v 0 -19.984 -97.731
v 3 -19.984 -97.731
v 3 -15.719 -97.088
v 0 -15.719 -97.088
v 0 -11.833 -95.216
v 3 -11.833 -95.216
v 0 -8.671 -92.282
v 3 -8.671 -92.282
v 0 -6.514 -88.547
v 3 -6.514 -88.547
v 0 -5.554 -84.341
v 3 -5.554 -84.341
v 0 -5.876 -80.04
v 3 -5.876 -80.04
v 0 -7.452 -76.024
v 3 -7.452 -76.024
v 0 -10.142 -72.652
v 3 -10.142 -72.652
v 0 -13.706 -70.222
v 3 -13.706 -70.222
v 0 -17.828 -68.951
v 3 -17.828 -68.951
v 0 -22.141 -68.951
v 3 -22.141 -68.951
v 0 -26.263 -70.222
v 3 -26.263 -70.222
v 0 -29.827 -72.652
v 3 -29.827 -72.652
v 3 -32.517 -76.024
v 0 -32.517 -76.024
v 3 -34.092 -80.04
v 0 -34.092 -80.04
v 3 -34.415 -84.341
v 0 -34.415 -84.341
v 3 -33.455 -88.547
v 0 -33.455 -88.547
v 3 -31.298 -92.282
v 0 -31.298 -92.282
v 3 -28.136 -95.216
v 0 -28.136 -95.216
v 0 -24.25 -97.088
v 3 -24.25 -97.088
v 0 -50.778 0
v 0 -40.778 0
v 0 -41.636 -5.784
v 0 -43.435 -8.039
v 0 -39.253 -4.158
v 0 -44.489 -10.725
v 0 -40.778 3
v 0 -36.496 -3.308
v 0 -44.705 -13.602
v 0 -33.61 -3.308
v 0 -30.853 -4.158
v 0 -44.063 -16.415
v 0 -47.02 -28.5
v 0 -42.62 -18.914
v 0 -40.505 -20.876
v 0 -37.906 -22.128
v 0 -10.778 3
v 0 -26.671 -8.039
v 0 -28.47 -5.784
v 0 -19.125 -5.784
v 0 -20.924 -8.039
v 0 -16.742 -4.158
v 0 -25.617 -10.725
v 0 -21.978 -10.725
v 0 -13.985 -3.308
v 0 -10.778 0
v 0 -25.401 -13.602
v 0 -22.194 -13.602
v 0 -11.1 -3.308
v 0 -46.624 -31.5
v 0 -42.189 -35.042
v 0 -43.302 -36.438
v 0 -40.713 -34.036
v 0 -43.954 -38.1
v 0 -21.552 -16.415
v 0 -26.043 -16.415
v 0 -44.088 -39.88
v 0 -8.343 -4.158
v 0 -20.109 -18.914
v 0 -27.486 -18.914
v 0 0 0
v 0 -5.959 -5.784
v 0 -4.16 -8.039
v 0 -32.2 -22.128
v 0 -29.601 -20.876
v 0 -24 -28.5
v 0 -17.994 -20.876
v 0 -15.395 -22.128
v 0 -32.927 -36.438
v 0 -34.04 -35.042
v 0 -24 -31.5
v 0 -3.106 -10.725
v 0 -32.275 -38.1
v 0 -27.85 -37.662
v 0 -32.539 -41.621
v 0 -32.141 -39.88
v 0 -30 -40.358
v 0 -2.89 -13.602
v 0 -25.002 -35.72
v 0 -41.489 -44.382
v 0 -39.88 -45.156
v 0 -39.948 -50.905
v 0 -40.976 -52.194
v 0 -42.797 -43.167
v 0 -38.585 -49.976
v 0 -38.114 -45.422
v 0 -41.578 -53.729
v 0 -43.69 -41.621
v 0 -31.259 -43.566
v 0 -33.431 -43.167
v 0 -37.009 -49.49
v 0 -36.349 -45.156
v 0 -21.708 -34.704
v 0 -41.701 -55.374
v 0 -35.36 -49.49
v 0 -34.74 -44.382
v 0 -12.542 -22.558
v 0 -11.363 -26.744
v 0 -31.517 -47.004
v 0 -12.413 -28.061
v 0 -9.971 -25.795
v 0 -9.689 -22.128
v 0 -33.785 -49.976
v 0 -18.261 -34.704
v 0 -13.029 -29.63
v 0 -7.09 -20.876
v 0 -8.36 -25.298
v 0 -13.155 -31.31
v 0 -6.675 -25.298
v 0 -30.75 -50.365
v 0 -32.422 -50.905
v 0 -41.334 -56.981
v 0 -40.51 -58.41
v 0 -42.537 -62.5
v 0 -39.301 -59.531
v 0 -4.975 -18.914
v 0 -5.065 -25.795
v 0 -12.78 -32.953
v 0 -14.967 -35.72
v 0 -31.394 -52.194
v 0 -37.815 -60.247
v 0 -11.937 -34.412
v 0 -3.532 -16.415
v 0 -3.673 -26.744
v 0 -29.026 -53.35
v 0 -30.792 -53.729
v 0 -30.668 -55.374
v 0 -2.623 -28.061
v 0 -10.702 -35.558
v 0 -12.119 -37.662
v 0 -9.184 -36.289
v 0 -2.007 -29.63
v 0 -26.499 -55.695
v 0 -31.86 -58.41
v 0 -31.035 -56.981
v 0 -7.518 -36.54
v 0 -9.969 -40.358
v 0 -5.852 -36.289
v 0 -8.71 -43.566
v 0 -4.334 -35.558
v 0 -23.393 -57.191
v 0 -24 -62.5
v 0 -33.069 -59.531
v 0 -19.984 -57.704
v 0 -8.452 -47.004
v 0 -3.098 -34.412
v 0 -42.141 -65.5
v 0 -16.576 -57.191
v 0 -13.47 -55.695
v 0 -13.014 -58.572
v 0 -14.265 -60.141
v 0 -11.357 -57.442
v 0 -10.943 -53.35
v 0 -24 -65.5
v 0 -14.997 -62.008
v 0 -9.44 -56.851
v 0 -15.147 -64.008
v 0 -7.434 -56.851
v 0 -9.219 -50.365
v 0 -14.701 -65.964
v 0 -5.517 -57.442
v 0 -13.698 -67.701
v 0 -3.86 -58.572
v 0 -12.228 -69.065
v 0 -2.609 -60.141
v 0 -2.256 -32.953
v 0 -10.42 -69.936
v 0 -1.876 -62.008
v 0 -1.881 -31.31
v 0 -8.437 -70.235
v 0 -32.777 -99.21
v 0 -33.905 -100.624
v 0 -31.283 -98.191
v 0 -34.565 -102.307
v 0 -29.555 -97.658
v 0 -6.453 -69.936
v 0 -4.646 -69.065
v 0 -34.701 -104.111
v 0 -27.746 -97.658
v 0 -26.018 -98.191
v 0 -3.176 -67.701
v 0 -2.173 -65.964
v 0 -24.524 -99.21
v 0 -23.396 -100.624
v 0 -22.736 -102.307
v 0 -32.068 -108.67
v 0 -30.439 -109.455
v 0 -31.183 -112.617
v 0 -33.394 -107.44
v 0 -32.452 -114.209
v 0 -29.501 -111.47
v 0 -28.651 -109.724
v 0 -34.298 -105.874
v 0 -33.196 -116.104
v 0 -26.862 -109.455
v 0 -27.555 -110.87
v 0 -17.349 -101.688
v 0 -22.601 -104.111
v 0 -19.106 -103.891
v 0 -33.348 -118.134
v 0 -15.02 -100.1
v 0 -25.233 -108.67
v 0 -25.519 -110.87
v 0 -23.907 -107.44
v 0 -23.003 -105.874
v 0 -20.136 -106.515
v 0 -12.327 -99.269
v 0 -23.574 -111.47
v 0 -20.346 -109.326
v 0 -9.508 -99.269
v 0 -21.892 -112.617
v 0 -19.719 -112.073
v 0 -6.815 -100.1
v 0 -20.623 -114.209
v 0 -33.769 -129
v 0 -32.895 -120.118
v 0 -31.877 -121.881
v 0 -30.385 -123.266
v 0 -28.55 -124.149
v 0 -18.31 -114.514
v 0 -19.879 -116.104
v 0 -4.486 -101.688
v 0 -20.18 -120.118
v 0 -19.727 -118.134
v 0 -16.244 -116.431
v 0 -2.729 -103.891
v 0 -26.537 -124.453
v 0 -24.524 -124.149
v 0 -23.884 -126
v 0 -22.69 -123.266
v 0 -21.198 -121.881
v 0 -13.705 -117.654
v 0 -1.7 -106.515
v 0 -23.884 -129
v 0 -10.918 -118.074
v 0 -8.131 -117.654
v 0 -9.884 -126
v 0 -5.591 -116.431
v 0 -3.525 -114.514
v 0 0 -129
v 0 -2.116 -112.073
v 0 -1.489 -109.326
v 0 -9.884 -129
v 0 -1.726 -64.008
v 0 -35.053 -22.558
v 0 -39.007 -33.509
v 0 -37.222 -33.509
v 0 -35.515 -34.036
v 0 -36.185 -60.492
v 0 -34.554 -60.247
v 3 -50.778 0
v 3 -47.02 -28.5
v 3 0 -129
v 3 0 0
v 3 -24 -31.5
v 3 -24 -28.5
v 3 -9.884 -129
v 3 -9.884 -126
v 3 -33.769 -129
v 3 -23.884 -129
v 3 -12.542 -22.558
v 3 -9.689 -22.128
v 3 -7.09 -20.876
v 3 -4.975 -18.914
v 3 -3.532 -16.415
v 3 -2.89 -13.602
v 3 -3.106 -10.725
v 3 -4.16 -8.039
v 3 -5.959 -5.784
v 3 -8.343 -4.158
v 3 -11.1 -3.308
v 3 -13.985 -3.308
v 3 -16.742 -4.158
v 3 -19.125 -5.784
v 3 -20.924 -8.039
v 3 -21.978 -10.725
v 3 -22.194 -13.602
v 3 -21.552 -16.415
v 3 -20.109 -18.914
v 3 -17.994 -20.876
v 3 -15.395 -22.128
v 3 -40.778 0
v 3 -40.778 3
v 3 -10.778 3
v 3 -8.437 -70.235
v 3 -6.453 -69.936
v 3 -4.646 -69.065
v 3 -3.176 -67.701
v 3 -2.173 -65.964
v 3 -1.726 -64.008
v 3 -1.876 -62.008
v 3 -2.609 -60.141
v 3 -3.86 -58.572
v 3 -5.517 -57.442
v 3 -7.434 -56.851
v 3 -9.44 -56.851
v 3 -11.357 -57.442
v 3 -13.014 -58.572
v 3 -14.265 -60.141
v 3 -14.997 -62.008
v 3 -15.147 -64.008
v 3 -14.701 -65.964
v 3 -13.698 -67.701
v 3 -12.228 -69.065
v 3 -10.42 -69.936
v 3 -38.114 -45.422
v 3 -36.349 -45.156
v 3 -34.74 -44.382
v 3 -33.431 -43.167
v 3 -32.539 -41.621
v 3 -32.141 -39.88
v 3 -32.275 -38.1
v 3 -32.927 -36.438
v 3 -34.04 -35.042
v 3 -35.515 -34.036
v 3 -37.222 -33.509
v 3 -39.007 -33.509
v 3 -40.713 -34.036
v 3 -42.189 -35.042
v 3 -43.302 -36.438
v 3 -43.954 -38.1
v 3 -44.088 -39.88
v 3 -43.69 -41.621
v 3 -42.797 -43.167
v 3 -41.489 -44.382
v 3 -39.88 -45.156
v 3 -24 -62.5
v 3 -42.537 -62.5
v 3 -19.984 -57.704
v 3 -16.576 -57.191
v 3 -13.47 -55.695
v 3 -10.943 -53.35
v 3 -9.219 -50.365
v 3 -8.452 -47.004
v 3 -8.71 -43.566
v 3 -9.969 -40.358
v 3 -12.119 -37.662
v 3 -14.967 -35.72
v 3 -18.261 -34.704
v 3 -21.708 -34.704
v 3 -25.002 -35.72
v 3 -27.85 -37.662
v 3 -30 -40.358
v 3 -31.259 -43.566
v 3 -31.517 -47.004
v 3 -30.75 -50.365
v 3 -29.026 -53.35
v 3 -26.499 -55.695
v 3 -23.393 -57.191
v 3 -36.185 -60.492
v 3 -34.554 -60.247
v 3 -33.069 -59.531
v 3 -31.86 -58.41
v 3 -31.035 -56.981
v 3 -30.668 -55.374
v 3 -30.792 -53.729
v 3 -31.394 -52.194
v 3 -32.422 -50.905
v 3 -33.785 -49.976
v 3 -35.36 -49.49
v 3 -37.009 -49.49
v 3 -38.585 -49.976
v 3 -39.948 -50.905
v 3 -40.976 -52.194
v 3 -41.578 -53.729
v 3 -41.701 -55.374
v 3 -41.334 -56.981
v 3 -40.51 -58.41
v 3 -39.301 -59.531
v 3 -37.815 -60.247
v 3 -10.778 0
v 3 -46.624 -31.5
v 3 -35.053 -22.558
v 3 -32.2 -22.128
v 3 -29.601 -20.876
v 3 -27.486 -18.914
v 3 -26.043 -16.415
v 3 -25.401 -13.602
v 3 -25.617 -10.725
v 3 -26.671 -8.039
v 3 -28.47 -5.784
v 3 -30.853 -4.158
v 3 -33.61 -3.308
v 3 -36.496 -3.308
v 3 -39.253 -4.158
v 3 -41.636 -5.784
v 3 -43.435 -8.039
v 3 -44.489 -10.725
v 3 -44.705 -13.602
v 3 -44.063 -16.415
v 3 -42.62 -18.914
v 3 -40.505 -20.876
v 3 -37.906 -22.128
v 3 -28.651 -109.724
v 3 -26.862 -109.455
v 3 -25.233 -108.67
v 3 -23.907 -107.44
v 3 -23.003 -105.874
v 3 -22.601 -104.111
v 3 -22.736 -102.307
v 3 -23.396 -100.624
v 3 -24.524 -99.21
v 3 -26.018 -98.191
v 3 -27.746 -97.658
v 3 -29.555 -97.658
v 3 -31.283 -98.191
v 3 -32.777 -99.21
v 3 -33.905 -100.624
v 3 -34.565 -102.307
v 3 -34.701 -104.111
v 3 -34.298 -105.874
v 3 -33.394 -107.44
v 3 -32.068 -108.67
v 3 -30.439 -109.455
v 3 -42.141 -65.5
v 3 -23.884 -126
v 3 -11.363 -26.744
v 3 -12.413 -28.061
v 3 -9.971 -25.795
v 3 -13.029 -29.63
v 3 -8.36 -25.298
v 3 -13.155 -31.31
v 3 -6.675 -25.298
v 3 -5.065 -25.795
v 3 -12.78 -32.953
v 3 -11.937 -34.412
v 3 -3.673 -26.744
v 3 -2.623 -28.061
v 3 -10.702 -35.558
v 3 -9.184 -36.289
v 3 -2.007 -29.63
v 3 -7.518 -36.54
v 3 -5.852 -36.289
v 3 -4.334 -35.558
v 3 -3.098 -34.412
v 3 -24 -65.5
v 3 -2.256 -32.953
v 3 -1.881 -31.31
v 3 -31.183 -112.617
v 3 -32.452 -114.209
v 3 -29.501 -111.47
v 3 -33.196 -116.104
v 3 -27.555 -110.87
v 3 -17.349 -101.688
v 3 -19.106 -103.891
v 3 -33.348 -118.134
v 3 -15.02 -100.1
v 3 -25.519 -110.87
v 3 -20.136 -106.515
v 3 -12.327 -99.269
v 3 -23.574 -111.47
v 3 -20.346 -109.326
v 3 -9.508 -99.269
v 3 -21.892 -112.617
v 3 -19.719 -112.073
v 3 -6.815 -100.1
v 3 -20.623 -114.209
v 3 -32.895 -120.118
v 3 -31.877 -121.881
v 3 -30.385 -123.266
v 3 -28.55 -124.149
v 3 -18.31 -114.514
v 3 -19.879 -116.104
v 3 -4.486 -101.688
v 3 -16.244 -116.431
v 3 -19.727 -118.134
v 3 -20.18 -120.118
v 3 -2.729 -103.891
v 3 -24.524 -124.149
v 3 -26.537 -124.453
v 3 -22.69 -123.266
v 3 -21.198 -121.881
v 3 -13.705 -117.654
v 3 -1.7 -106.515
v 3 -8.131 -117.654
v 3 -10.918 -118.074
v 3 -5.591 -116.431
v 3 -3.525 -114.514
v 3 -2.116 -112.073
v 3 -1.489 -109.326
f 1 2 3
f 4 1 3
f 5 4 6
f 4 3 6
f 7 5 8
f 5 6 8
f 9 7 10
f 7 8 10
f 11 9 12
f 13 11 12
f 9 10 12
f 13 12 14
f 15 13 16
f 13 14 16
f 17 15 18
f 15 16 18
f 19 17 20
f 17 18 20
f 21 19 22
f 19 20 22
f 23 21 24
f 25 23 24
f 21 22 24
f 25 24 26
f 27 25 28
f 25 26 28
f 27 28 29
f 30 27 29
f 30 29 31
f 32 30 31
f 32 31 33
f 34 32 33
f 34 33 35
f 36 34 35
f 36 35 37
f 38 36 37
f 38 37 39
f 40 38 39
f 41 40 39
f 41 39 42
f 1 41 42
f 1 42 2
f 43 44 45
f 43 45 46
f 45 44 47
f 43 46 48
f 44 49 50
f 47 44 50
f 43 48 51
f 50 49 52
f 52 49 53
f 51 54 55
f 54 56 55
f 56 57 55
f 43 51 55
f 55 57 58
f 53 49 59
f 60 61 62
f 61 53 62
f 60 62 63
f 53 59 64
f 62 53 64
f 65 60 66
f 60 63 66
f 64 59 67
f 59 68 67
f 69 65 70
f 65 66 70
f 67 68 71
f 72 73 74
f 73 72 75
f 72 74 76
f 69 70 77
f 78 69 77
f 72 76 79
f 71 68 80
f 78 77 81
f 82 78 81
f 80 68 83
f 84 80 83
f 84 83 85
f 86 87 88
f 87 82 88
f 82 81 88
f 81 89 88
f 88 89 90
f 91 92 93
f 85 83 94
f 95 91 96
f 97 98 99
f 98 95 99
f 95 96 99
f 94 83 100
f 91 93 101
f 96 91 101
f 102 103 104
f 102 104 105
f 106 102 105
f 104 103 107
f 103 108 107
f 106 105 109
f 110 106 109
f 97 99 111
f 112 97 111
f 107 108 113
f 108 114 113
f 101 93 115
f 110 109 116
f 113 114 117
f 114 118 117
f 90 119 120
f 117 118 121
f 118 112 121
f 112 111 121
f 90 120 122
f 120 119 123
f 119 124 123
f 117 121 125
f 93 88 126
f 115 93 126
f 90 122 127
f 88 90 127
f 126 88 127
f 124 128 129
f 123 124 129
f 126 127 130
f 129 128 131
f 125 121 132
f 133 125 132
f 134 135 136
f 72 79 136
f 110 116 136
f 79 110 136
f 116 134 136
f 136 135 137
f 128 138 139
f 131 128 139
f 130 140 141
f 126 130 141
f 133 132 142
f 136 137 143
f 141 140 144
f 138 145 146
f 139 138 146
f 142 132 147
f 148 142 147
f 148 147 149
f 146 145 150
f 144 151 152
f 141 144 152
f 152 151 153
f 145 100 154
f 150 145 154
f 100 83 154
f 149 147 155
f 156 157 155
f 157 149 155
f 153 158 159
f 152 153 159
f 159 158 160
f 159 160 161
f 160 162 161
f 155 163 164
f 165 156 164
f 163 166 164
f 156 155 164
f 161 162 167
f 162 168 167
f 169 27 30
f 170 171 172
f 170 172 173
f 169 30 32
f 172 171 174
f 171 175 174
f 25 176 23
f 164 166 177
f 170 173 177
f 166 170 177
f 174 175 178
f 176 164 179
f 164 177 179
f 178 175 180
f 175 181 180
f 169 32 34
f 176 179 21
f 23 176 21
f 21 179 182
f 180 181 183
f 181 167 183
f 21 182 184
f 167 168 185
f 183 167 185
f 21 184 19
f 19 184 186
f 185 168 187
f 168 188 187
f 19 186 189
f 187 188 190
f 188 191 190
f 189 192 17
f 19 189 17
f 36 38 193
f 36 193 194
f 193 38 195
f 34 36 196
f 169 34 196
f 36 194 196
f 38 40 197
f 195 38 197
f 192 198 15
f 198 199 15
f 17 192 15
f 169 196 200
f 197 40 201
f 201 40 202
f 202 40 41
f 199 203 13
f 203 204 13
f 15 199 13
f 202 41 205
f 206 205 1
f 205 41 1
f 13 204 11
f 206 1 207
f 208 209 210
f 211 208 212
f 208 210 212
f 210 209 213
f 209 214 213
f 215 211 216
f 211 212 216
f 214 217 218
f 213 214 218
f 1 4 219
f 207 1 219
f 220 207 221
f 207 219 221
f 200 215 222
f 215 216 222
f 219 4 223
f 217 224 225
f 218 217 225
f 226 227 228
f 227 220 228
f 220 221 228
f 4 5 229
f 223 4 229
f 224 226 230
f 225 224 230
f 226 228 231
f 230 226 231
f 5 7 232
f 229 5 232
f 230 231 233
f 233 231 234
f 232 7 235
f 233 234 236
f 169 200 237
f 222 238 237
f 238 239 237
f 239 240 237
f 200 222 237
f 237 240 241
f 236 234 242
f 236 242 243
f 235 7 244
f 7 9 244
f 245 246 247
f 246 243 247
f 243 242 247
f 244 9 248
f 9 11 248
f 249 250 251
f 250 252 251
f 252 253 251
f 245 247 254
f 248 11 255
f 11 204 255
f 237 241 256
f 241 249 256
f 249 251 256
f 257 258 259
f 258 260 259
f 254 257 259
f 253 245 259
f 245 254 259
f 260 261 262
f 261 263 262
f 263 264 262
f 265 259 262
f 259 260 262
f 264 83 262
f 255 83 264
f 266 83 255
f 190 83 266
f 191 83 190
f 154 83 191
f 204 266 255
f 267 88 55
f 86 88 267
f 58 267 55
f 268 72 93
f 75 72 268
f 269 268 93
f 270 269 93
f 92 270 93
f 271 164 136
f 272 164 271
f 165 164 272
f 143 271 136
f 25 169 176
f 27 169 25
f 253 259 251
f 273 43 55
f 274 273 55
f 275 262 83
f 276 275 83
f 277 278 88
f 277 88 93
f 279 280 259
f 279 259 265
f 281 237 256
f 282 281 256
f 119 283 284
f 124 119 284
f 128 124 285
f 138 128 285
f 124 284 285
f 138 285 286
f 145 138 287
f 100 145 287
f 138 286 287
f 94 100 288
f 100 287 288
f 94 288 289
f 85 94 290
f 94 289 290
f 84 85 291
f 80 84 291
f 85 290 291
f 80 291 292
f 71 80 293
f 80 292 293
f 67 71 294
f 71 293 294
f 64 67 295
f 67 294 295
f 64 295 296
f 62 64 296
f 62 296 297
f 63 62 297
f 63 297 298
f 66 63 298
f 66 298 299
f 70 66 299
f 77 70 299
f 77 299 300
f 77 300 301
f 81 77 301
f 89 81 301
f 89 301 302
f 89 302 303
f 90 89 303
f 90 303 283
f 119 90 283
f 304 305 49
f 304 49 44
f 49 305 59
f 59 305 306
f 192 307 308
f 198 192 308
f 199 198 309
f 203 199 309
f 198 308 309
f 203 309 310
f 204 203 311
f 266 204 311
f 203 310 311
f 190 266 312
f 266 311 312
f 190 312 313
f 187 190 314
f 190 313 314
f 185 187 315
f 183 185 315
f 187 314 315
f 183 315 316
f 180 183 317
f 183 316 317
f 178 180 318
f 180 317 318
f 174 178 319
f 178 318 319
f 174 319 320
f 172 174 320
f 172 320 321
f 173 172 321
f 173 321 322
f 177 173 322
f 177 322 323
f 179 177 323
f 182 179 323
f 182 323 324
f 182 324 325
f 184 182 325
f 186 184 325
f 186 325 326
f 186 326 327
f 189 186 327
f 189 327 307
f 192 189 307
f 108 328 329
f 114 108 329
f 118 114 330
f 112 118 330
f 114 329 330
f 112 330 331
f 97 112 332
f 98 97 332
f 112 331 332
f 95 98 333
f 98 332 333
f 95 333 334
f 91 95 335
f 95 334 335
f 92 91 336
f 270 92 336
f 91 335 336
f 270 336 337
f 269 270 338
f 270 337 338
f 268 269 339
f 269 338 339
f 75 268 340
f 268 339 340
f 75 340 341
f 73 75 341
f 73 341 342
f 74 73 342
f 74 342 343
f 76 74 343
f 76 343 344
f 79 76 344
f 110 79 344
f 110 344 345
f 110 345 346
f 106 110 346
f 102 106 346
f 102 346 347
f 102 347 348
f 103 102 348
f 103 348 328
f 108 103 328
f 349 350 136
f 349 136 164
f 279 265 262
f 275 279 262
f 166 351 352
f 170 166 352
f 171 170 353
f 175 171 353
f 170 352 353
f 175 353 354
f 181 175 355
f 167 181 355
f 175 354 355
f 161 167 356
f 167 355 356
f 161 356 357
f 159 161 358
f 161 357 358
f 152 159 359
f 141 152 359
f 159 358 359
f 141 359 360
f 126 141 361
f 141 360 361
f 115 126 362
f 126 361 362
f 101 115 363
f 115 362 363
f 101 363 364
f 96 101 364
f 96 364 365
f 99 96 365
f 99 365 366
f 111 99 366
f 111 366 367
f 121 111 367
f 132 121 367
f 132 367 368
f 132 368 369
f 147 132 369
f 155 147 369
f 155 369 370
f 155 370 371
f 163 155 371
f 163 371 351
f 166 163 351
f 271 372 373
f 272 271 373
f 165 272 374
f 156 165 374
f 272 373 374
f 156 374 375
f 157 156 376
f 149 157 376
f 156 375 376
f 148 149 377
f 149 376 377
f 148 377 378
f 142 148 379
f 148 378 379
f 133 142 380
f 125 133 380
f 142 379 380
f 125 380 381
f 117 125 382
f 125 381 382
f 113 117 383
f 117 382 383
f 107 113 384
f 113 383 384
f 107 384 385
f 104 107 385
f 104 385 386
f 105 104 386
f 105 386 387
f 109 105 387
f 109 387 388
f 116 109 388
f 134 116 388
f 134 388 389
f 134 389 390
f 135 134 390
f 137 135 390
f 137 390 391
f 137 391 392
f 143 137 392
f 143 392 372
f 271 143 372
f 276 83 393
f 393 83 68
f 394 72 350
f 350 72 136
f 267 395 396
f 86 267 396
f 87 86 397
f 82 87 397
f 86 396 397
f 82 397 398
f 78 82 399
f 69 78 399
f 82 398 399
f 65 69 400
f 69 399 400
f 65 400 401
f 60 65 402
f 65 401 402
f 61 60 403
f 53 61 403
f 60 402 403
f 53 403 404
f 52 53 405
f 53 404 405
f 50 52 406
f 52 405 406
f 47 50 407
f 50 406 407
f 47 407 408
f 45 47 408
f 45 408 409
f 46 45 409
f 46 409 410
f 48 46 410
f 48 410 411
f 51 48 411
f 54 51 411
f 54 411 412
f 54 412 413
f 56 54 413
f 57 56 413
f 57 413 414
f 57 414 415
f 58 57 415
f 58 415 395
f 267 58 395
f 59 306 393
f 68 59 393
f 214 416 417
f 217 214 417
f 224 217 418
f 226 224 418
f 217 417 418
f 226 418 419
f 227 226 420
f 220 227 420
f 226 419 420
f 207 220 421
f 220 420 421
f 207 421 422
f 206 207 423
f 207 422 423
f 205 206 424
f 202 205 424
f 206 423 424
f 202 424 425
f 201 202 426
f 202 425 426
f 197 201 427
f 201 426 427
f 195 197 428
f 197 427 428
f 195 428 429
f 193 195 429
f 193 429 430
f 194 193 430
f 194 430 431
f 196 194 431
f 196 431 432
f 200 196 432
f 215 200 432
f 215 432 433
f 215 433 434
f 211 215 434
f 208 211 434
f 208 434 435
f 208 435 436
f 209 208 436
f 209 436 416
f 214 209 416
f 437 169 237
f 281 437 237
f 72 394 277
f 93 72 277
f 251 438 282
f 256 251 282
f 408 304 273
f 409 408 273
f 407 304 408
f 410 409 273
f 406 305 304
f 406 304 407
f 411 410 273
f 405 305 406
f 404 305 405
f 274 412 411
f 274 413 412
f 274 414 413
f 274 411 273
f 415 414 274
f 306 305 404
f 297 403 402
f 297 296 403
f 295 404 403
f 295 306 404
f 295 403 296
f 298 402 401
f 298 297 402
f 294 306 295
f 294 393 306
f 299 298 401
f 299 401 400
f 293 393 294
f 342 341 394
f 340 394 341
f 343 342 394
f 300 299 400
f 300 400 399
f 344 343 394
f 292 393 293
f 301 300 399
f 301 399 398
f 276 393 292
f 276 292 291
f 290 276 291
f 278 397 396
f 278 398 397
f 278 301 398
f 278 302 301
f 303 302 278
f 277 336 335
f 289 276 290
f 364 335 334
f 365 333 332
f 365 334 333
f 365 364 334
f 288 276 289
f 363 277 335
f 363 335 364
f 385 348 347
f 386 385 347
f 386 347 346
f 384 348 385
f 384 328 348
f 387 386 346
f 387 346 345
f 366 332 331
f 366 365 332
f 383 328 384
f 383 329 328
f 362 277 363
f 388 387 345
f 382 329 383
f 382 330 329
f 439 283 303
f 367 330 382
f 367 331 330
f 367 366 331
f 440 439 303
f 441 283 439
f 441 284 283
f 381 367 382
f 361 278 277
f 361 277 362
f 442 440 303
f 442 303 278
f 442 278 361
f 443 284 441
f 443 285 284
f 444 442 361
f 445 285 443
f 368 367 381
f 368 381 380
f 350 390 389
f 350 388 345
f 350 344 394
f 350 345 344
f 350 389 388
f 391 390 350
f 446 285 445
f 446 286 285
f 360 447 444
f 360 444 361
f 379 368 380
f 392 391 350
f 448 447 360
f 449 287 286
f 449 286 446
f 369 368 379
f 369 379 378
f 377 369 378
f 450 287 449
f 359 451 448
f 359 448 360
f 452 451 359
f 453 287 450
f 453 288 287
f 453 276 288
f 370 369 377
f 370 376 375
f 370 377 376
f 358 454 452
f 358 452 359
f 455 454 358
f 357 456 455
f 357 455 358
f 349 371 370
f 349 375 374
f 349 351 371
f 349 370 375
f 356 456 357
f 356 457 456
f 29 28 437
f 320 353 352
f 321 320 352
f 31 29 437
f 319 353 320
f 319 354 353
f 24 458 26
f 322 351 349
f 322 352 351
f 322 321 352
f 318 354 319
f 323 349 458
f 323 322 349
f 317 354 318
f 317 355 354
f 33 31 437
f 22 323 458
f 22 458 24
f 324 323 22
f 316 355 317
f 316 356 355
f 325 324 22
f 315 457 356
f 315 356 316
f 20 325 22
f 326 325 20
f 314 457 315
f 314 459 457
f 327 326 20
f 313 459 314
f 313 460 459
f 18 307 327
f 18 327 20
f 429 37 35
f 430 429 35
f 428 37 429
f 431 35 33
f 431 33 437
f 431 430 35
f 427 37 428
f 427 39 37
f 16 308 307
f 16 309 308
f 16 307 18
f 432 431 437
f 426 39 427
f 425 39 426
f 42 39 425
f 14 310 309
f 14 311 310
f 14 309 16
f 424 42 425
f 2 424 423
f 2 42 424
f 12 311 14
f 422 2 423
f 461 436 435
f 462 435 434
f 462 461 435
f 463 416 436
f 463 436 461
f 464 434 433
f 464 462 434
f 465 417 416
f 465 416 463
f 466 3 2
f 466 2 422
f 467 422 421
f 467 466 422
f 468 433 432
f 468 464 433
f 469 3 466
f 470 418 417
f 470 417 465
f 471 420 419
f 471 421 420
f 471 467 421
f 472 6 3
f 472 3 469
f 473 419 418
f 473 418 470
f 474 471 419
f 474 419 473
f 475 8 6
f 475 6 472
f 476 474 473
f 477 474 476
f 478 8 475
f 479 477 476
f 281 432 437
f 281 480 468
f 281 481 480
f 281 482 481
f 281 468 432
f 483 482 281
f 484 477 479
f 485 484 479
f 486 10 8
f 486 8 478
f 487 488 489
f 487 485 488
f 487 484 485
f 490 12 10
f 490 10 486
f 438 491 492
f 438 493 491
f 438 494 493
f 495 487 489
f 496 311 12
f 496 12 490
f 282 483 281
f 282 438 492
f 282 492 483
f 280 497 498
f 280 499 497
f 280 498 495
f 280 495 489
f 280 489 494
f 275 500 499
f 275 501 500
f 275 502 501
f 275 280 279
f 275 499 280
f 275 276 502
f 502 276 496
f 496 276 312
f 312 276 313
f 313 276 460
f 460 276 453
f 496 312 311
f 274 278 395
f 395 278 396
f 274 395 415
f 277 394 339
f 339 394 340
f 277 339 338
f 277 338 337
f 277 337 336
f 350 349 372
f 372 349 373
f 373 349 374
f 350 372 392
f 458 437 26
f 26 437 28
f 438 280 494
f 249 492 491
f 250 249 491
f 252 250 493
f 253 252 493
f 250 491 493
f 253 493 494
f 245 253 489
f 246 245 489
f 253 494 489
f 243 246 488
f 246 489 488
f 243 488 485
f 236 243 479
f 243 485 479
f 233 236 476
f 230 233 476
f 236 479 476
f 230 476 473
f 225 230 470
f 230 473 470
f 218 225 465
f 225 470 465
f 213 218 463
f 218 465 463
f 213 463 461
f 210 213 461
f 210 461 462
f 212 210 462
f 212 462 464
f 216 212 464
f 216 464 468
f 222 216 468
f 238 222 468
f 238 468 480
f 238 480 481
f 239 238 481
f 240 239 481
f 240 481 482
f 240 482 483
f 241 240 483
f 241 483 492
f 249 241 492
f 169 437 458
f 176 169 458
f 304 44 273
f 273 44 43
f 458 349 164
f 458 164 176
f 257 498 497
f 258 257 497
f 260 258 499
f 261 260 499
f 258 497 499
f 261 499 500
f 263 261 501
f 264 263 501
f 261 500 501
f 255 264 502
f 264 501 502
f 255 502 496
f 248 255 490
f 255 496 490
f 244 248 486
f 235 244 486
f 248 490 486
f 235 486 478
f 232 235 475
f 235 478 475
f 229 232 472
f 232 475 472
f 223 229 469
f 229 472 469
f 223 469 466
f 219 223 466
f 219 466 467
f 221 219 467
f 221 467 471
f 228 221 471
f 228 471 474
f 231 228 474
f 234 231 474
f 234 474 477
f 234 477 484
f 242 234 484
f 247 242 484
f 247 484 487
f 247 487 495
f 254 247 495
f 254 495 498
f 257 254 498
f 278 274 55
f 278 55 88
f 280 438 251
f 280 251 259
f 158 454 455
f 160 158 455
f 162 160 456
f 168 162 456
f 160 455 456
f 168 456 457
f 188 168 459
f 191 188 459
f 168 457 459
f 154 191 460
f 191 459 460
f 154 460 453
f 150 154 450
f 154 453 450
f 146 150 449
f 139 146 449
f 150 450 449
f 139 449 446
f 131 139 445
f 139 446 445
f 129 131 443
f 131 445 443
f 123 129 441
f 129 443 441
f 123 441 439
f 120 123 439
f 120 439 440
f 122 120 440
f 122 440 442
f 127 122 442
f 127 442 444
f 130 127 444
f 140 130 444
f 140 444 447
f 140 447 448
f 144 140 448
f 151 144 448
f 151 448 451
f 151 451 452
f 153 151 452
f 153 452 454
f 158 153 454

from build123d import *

# Parameters (mm, degrees)
BOSS_EXTRUDE1_DEPTH     = 3
SKETCH2_W               = 3
SKETCH2_H               = 28.023136596
SKETCH2_H_2             = 21.36601765
CUT_EXTRUDE1_DEPTH      = 20
SKETCH3_W               = 3
SKETCH3_H               = 30
BOSS_EXTRUDE2_DEPTH     = 3
SKETCH4_R               = 11.564612176
SKETCH4_R_2             = 9.45507824
SKETCH4_R_3             = 14.470802902
SKETCH4_R_4             = 9.678963713
SKETCH4_R_5             = 5.652740002
SKETCH4_R_6             = 5.531973284
SKETCH4_R_7             = 5.989913263
SKETCH4_R_8             = 6.729308726
SKETCH4_R_9             = 6.066934598
SKETCH4_R_10            = 6.829551901
CUT_EXTRUDE2_DEPTH      = 1
CUT_EXTRUDE2_DEPTH_BACK = 4
SKETCH5_W               = 3
SKETCH5_H               = 14
CUT_EXTRUDE3_DEPTH      = 10


with BuildPart() as part:
    # Sketch1 → Boss-Extrude1 (new body)
    with BuildSketch(Plane(origin=(0, 0, 0), x_dir=(0, 0, -1), z_dir=(1, 0, 0))):
        Polygon((0, 0), (0, -50.777676291), (129, -33.768874681), (129, 0), align=None)
    extrude(amount=BOSS_EXTRUDE1_DEPTH)

    # Sketch2 → Cut-Extrude1 (cut)
    with BuildSketch(Plane(origin=(3, 0, 0), x_dir=(0, 0, -1), z_dir=(1, 0, 0))):
        with Locations((30, -38.011568298)):
            Rectangle(SKETCH2_W, SKETCH2_H)
        with Locations((64, -34.683008825)):
            Rectangle(SKETCH2_W, SKETCH2_H_2)
    extrude(amount=-CUT_EXTRUDE1_DEPTH, mode=Mode.SUBTRACT)

    # Sketch3 → Boss-Extrude2 (add)
    with BuildSketch(Plane(origin=(3, 0, 0), x_dir=(0, 0, -1), z_dir=(1, 0, 0))):
        with Locations((-1.5, -25.777676291)):
            Rectangle(SKETCH3_W, SKETCH3_H)
    extrude(amount=-BOSS_EXTRUDE2_DEPTH)

    # Sketch4 → Cut-Extrude2 (cut, two sides)
    with BuildSketch(Plane(origin=(3, 0, 0), x_dir=(0, 0, -1), z_dir=(1, 0, 0))) as cut_extrude2_sk:
        with Locations((46.139822704, -19.984473783)):
            Circle(SKETCH4_R)
        with Locations((108.618953829, -10.917568804)):
            Circle(SKETCH4_R_2)
        with Locations((83.259777078, -19.984473783)):
            Circle(SKETCH4_R_3)
        with Locations((12.878873487, -12.542106693)):
            Circle(SKETCH4_R_4)
        with Locations((12.878873487, -35.052970113)):
            Circle(SKETCH4_R_4)
        with Locations((30.887564223, -7.517969022)):
            Circle(SKETCH4_R_5)
        with Locations((54.960405921, -36.18486448)):
            Circle(SKETCH4_R_6)
        with Locations((39.432504215, -38.114367059)):
            Circle(SKETCH4_R_7)
        with Locations((63.505345914, -8.436779774)):
            Circle(SKETCH4_R_8)
        with Locations((103.657375769, -28.650616315)):
            Circle(SKETCH4_R_9)
        with Locations((117.623299197, -26.537351586)):
            Circle(SKETCH4_R_10)
    extrude(amount=CUT_EXTRUDE2_DEPTH, mode=Mode.SUBTRACT)
    extrude(cut_extrude2_sk.sketch, amount=-CUT_EXTRUDE2_DEPTH_BACK, mode=Mode.SUBTRACT)

    # Sketch5 → Cut-Extrude3 (cut)
    with BuildSketch(Plane(origin=(3, 0, 0), x_dir=(0, 0, -1), z_dir=(1, 0, 0))):
        with Locations((127.5, -16.88443734)):
            Rectangle(SKETCH5_W, SKETCH5_H)
    extrude(amount=-CUT_EXTRUDE3_DEPTH, mode=Mode.SUBTRACT)


solid = part.part
